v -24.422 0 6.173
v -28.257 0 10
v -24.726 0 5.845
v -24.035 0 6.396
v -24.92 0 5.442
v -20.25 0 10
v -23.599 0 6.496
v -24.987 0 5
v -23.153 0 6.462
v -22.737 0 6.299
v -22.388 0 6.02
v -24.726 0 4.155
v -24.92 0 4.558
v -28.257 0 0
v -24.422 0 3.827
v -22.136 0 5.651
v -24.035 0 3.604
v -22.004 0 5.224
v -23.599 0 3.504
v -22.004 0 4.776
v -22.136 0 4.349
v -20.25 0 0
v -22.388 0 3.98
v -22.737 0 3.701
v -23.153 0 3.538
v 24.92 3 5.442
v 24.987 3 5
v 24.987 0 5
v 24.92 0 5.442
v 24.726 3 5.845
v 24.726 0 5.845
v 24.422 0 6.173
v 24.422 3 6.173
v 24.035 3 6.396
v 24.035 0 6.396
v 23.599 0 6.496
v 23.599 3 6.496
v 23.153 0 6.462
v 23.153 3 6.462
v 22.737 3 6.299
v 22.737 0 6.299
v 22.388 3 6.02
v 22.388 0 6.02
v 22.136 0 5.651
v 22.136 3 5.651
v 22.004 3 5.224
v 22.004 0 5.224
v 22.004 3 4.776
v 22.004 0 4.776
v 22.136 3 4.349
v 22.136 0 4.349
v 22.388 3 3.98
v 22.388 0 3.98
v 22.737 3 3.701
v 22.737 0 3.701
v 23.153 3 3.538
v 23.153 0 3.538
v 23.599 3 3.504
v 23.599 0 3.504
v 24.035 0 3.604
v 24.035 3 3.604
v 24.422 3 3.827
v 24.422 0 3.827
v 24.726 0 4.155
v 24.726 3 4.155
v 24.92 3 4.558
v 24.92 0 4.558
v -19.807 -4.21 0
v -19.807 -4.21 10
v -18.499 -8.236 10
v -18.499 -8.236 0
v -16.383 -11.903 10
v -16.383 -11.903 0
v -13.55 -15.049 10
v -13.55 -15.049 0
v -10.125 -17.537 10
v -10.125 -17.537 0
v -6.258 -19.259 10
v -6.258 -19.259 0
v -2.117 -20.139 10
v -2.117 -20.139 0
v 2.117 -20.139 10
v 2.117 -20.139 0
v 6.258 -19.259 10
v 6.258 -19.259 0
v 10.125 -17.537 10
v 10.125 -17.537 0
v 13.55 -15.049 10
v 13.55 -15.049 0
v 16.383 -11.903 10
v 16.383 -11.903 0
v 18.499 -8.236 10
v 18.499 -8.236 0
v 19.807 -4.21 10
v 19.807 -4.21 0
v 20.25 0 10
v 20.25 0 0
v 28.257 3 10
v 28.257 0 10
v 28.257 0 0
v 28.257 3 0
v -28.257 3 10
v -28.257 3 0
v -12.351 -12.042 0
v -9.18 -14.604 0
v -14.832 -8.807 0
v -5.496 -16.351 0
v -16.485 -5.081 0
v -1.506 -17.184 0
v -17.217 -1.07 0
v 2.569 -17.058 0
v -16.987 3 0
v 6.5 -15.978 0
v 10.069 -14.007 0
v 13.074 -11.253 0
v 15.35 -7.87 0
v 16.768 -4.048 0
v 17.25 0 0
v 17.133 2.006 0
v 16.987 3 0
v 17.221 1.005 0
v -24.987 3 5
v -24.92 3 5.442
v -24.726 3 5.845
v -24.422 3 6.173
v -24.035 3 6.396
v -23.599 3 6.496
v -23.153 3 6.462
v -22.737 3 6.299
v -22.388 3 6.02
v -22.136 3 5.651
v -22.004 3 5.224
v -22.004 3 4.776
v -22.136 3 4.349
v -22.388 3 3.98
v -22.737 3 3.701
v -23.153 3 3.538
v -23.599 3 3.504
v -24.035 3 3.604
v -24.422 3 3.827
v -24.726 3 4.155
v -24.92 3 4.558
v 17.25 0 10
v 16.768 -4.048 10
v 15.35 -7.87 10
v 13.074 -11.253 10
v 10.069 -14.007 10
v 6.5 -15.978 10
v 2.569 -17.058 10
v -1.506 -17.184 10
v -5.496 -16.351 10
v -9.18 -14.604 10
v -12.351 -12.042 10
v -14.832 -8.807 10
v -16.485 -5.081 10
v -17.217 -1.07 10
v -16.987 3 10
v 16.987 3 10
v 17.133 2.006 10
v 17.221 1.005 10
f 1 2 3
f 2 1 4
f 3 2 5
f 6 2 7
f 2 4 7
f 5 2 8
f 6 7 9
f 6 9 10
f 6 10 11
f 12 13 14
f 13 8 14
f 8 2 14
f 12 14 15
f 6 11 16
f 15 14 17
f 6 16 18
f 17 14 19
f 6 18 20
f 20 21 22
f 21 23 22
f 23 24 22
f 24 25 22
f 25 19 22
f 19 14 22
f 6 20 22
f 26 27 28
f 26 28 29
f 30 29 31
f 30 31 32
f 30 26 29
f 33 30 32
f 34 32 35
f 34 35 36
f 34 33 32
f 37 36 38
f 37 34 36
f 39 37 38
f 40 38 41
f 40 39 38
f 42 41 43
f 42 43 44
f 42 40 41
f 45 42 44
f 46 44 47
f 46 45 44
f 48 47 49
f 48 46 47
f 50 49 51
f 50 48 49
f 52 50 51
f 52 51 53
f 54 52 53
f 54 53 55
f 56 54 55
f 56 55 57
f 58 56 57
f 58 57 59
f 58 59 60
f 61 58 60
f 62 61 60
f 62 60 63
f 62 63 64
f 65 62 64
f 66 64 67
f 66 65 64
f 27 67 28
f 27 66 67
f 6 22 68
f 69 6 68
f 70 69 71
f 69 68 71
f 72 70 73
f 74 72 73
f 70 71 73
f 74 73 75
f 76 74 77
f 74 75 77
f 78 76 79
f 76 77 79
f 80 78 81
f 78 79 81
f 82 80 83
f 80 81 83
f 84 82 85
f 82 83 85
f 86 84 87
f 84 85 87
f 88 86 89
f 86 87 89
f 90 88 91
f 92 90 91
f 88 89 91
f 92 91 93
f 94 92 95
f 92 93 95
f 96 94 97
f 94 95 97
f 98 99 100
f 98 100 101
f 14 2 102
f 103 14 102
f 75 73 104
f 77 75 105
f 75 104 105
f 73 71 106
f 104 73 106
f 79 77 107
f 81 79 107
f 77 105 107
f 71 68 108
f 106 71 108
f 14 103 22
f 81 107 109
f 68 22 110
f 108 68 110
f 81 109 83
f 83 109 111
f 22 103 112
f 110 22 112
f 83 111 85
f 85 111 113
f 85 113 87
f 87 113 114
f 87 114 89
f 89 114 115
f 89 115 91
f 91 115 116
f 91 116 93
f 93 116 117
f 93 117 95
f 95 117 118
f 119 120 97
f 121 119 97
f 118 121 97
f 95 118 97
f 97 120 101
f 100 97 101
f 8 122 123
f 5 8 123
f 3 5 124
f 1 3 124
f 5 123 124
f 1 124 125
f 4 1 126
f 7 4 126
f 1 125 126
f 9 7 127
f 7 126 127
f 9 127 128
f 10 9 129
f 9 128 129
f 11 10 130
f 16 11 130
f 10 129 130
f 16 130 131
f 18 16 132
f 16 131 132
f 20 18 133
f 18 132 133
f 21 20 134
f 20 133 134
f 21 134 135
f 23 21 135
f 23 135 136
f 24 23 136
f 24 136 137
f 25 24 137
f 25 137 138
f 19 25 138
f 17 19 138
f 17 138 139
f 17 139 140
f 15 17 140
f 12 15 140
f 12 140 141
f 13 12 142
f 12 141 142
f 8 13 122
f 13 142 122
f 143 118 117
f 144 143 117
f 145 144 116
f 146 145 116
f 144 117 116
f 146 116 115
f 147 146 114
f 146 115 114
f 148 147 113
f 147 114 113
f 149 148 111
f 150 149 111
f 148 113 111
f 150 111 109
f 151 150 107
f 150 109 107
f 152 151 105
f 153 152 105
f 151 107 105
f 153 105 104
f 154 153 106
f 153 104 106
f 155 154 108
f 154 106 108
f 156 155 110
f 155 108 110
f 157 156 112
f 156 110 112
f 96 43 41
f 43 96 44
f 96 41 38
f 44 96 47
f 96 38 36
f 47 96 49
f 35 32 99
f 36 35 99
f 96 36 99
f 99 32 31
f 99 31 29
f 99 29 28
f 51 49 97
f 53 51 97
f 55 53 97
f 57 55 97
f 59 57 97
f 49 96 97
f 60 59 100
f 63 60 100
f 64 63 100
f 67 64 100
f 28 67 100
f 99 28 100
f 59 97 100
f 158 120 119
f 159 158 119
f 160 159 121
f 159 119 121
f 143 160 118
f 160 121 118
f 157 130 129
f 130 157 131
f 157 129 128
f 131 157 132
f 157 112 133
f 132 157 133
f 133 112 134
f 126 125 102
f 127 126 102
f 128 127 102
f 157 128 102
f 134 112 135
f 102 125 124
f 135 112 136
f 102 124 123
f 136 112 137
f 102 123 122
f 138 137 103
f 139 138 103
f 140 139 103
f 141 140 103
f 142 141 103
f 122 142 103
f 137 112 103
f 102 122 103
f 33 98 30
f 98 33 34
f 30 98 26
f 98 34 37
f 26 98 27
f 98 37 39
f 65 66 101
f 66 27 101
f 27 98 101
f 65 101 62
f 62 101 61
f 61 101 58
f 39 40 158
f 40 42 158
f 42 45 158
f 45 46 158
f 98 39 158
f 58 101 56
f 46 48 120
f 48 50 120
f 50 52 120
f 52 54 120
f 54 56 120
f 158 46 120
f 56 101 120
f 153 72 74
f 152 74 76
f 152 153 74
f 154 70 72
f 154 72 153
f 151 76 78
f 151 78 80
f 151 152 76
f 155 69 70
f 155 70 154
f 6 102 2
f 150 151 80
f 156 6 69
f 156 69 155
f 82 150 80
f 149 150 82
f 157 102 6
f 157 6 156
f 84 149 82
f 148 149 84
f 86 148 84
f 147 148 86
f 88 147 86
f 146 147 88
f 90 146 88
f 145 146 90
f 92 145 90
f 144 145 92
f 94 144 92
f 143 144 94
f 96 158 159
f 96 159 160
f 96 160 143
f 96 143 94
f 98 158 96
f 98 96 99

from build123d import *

# Parameters (mm, degrees)
SKETCH1_W           = 1.27
SKETCH1_H           = 3
BOSS_EXTRUDE1_DEPTH = 10
CUT_EXTRUDE1_DEPTH  = 3


with BuildPart() as part:
    # Sketch1 → Boss-Extrude1 (new body)
    with BuildSketch(Plane.XY):
        with BuildLine():
            ThreePointArc((17.250000044, 0), (-1.505747486, -17.18415625), (-16.987127524, 3))
            Line((-16.987127524, 3), (-26.987127524, 3))
            Line((-26.987127524, 3), (-26.987127524, 0))
            Line((-26.987127524, 0), (-20.250000044, 0))
            ThreePointArc((-20.250000044, 0), (0, -20.250000044), (20.250000044, 0))
            Line((20.250000044, 0), (26.987127524, 0))
            Line((26.987127524, 0), (26.987127524, 3))
            Line((26.987127524, 3), (16.987127524, 3))
            ThreePointArc((16.987127524, 3), (17.18415625, 1.505747486), (17.250000044, 0))
        make_face()
        with Locations((27.622127524, 1.5)):
            Rectangle(SKETCH1_W, SKETCH1_H)
        with Locations((-27.622127524, 1.5)):
            Rectangle(SKETCH1_W, SKETCH1_H)
    extrude(amount=BOSS_EXTRUDE1_DEPTH)

    # Sketch2 → Cut-Extrude1 (cut)
    with BuildSketch(Plane(origin=(0, 3, 0), x_dir=(1, 0, 0), z_dir=(0, 1, 0))):
        with BuildLine():
            ThreePointArc((-21.987127524, -5), (-23.487127524, -3.5), (-24.987127524, -5))
            Line((-24.987127524, -5), (-21.987127524, -5))
        make_face()
        with BuildLine():
            Line((-21.987127524, -5), (-24.987127524, -5))
            ThreePointArc((-24.987127524, -5), (-23.487127524, -6.5), (-21.987127524, -5))
        make_face()
    cut_extrude1 = extrude(amount=-CUT_EXTRUDE1_DEPTH, mode=Mode.SUBTRACT)

    # Mirror1: Cut-Extrude1 across plane
    add(cut_extrude1.mirror(Plane(origin=(0, 0, 0), x_dir=(0, 0, 1), z_dir=(1, 0, 0))), mode=Mode.SUBTRACT)


solid = part.part
